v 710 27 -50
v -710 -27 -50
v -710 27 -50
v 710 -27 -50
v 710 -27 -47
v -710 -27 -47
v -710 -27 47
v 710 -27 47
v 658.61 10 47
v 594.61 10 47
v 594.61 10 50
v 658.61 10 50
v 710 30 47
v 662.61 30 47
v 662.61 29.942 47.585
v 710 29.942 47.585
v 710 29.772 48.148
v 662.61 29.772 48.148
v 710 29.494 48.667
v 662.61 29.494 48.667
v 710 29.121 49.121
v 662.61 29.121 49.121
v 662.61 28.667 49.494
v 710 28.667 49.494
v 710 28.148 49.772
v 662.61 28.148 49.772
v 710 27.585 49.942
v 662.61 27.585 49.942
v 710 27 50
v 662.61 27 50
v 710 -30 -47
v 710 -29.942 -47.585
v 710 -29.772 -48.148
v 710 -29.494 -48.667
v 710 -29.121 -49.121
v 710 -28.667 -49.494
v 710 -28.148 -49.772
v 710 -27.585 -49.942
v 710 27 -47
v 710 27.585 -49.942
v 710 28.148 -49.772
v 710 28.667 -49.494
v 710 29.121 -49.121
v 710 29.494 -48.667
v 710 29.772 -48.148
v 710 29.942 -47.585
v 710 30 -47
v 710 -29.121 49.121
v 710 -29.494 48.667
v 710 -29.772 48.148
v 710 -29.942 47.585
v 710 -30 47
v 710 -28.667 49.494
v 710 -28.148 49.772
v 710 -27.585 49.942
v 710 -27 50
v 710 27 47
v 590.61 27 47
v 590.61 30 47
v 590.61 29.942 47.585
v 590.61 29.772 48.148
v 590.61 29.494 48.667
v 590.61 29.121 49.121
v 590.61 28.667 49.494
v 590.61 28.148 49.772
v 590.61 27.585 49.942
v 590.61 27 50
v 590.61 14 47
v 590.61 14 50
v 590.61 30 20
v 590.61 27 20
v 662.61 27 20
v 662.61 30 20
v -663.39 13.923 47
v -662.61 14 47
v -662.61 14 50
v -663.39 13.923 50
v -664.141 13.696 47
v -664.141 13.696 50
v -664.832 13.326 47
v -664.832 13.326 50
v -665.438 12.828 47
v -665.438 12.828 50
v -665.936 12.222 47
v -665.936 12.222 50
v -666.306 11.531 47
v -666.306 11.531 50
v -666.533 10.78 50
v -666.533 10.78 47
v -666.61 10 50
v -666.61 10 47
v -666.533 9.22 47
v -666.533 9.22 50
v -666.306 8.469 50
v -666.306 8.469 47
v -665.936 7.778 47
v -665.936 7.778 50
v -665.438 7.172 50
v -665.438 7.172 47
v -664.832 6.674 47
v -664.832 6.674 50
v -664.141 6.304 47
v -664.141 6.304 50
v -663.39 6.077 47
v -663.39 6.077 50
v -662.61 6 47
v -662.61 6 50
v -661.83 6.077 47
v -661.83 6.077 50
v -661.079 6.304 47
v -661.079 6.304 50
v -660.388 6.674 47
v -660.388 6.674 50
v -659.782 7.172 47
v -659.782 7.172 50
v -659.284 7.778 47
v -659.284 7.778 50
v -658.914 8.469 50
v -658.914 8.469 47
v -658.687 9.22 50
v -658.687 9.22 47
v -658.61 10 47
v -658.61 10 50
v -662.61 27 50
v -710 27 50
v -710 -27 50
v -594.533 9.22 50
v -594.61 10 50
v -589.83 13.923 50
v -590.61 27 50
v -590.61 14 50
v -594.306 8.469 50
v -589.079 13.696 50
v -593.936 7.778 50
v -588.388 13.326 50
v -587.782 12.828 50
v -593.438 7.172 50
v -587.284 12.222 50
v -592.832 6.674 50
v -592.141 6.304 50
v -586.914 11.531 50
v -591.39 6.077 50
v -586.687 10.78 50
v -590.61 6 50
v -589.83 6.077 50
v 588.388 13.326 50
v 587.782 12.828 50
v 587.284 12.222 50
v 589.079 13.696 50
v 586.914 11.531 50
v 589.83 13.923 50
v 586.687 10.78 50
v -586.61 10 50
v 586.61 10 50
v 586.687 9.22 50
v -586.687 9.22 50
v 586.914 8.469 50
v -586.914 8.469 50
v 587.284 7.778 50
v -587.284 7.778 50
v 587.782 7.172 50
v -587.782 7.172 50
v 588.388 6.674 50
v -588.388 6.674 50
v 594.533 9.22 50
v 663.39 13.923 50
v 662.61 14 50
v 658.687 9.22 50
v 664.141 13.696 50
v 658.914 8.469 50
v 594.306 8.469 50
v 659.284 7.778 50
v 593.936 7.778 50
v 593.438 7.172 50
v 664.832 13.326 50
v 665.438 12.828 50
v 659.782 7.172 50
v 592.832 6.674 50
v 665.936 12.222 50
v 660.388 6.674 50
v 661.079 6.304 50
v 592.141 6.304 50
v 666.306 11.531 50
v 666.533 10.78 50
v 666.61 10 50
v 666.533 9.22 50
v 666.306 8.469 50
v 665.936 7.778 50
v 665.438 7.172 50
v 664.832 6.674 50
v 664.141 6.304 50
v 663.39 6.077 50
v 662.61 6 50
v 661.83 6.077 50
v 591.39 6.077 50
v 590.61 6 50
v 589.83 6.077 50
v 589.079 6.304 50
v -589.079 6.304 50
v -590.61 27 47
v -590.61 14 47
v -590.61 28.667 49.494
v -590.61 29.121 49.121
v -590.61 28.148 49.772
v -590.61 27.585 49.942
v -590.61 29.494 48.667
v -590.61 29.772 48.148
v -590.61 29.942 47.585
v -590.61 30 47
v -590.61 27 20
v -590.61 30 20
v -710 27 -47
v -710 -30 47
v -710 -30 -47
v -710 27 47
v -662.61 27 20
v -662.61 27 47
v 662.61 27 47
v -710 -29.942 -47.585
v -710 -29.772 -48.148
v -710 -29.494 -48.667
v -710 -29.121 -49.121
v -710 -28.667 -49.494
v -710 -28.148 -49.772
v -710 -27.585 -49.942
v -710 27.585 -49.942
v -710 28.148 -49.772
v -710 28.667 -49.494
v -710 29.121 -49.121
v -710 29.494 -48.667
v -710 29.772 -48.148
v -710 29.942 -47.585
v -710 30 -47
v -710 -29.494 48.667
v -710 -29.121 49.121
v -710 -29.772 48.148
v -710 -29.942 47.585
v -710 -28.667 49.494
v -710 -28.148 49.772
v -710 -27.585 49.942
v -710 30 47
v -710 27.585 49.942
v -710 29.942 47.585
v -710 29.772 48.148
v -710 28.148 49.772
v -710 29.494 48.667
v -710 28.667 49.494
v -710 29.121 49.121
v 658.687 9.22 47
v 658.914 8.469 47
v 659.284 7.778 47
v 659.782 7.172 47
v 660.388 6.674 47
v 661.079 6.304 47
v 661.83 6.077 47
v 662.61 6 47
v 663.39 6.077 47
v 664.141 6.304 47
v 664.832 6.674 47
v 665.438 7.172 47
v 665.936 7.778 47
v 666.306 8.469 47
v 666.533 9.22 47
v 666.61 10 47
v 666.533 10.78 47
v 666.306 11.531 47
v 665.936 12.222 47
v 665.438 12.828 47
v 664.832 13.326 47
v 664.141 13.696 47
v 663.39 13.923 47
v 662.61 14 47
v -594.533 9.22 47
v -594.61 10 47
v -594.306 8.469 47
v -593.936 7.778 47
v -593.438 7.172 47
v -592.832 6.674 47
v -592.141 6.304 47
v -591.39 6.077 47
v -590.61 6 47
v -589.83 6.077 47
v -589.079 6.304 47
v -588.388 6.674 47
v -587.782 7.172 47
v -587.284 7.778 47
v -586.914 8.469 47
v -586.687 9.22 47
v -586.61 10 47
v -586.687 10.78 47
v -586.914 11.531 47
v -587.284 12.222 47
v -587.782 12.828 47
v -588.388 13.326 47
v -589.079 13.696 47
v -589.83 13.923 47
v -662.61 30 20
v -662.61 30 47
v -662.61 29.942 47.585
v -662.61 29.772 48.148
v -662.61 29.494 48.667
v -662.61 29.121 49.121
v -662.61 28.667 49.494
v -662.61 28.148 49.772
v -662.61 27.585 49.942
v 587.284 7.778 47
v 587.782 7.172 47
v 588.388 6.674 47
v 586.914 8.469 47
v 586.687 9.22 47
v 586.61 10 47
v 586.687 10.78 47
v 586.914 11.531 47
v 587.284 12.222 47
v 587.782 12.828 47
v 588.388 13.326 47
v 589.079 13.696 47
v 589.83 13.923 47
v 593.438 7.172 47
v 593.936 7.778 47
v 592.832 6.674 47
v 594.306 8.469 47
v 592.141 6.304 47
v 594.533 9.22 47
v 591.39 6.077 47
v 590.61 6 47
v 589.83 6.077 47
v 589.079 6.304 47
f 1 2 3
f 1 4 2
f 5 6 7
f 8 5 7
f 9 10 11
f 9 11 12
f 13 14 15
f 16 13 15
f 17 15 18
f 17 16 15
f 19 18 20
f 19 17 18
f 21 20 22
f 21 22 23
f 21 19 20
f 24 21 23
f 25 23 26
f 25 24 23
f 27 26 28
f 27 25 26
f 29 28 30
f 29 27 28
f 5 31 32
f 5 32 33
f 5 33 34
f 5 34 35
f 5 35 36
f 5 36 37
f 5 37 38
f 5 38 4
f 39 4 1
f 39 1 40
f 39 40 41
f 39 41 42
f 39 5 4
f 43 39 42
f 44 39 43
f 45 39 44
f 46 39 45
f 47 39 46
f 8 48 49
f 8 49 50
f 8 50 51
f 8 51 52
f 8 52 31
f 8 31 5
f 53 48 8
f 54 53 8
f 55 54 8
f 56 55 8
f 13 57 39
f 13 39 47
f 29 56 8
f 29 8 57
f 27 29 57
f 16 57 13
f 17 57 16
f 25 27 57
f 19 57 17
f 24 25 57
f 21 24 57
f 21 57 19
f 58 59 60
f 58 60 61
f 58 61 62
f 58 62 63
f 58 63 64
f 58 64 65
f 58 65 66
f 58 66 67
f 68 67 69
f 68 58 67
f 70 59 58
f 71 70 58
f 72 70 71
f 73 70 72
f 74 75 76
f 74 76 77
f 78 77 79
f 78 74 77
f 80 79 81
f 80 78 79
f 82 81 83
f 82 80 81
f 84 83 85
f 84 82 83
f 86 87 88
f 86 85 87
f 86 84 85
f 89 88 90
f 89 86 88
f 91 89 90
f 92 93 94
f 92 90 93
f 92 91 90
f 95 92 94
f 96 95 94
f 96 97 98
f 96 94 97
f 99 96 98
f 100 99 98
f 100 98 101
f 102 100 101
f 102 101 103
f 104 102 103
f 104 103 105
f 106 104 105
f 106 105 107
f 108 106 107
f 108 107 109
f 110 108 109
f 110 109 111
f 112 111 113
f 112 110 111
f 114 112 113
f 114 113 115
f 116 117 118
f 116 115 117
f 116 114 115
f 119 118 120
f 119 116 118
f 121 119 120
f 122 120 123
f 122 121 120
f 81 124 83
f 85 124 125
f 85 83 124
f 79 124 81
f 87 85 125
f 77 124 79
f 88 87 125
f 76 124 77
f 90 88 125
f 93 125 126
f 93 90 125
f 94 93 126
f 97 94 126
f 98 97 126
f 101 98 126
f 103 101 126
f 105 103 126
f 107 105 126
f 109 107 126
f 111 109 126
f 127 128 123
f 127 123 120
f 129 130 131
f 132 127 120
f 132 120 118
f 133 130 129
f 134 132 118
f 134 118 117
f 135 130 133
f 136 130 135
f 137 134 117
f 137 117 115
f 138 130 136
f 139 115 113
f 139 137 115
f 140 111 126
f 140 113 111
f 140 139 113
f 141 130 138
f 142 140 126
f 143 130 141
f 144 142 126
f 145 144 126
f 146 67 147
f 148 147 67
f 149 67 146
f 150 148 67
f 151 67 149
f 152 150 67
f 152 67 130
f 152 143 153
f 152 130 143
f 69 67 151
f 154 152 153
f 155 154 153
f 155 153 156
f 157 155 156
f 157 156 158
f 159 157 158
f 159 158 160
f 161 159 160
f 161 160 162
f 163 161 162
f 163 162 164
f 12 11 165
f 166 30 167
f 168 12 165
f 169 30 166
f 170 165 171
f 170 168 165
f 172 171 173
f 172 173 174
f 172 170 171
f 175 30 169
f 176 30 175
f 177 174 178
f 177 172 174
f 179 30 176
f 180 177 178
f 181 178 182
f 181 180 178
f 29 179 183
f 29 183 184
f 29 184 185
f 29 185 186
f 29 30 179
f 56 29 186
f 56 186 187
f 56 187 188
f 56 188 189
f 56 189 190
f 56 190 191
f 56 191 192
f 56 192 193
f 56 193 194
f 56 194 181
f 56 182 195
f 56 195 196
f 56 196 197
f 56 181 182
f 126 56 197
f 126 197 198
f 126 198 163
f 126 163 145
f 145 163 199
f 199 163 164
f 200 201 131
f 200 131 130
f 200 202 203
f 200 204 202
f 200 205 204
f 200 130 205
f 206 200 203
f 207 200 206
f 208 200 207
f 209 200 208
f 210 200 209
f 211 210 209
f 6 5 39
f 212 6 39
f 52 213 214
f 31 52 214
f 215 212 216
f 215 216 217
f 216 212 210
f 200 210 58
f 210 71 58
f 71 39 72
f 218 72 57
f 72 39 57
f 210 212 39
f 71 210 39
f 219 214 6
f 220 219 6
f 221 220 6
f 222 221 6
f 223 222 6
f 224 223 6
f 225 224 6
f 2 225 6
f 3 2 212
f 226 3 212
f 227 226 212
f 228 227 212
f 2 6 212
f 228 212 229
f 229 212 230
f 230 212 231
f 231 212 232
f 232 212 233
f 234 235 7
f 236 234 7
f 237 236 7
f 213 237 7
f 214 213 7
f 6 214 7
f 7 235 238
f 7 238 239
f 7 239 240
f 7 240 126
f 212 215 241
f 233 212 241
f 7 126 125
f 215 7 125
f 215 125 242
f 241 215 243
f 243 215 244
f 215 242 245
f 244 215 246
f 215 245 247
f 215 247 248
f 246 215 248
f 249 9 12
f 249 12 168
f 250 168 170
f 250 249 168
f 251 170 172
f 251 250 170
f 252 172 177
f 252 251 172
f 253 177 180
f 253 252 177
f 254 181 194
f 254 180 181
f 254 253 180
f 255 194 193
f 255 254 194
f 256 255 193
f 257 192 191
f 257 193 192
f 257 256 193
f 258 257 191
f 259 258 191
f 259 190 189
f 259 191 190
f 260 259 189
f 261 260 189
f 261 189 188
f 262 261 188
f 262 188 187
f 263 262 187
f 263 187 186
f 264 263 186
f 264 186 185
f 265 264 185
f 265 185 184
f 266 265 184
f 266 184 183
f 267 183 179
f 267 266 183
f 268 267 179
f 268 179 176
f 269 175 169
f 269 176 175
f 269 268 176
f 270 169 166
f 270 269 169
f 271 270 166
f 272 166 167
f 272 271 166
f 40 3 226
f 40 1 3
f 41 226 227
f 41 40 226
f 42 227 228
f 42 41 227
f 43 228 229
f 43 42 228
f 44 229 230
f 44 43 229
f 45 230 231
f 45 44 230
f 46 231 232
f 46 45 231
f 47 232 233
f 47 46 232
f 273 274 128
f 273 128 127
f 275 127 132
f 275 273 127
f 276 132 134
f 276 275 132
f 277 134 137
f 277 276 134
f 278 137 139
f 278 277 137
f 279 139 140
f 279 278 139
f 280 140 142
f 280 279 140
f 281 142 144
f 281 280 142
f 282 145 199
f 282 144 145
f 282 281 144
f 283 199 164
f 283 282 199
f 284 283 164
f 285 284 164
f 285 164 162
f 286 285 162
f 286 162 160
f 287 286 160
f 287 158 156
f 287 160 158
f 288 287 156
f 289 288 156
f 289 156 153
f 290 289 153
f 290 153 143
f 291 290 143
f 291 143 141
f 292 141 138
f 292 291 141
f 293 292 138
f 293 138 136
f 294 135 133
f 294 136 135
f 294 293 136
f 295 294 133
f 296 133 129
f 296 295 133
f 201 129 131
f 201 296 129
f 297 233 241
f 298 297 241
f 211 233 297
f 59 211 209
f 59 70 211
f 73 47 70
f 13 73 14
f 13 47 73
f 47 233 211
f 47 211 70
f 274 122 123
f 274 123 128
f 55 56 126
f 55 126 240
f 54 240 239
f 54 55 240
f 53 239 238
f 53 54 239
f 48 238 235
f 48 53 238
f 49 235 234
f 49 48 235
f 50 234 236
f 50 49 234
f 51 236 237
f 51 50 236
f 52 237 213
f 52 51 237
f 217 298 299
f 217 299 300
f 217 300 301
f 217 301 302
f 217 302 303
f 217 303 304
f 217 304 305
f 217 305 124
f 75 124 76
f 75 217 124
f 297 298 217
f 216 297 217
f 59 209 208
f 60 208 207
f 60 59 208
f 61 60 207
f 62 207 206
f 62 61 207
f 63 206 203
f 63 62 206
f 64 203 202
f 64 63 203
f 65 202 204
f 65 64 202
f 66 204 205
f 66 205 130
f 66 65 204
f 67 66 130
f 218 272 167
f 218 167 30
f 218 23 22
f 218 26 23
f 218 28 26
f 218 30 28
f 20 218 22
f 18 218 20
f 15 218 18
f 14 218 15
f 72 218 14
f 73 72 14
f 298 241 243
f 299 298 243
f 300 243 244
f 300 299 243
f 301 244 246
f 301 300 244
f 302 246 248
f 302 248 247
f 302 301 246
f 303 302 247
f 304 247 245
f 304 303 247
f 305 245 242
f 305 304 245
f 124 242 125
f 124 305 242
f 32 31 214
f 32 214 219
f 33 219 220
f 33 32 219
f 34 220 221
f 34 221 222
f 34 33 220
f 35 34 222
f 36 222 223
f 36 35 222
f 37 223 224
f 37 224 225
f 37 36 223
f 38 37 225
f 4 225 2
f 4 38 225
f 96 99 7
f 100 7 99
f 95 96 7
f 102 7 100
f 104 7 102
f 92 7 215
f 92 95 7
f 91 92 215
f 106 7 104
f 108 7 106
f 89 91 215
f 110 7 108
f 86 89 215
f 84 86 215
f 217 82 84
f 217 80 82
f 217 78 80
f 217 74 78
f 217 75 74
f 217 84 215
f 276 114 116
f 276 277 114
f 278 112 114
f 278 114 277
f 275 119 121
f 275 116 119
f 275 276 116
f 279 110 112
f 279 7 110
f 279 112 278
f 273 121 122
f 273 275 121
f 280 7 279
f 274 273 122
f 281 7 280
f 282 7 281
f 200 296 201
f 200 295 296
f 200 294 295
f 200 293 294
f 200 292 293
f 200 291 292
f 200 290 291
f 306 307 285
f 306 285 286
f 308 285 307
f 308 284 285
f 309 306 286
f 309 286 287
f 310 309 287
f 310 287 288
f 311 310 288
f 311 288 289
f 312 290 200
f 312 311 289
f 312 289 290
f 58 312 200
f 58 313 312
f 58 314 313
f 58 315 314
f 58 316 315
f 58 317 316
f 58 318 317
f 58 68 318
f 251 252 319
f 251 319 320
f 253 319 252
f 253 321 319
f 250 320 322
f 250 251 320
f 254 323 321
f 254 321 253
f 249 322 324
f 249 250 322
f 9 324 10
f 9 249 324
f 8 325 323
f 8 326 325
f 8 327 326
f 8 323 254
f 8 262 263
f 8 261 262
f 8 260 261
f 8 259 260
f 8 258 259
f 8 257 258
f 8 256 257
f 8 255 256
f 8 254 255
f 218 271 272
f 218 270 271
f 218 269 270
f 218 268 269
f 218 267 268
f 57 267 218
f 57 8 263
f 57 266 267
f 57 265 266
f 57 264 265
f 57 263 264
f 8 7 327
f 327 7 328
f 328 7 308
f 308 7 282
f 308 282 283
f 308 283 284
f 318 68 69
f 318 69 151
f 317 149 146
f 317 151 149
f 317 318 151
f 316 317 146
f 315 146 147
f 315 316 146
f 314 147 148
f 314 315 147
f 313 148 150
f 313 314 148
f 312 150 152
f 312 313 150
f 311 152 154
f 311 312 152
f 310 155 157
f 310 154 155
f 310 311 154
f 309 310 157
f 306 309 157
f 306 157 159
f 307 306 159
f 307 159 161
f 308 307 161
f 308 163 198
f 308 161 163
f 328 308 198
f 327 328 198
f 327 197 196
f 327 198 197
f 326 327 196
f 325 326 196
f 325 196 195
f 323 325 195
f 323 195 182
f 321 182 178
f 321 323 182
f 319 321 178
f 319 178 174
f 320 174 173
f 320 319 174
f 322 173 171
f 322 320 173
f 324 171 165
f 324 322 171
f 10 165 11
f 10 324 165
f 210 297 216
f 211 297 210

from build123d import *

# Parameters (mm, degrees)
F0_W     = 54
F0_H     = 94
F1_DEPTH = 710
F3_START = 20
F3_DEPTH = 35
F4_START = 20
F4_DEPTH = 35


with BuildPart() as f1:
    # F0 (on Right) → F1 (new body, symmetric)
    with BuildSketch(Plane.YZ):
        with BuildLine():
            ThreePointArc((30, 47), (29.1213203436, 49.1213203436), (27, 50))
            Line((27, 50), (-27, 50))
            ThreePointArc((-27, 50), (-29.1213203436, 49.1213203436), (-30, 47))
            Line((-30, 47), (-30, -47))
            ThreePointArc((-30, -47), (-29.1213203436, -49.1213203436), (-27, -50))
            Line((-27, -50), (27, -50))
            ThreePointArc((27, -50), (29.1213203436, -49.1213203436), (30, -47))
            Line((30, -47), (30, 47))
        make_face()
        Rectangle(F0_W, F0_H, mode=Mode.SUBTRACT)
    extrude(amount=F1_DEPTH, both=True)

    # F2 (on Top) → F3 (cut)
    with BuildSketch(Plane.XY.offset(F3_START)):
        with BuildLine():
            Line((-590.61, 40), (-662.61, 40))
            Line((-662.61, 40), (-662.61, 14))
            ThreePointArc((-662.61, 14), (-665.4384271247, 7.1715728753), (-658.61, 10))
            Line((-658.61, 10), (-594.61, 10))
            ThreePointArc((-594.61, 10), (-587.7815728753, 7.1715728753), (-590.61, 14))
            Line((-590.61, 14), (-590.61, 40))
        make_face()
    extrude(amount=F3_DEPTH, mode=Mode.SUBTRACT)

    # F2 (on Top) → F4 (cut)
    with BuildSketch(Plane.XY.offset(F4_START)):
        with BuildLine():
            Line((662.61, 14), (662.61, 40))
            Line((662.61, 40), (590.61, 40))
            Line((590.61, 40), (590.61, 14))
            ThreePointArc((590.61, 14), (587.7815728753, 7.1715728753), (594.61, 10))
            Line((594.61, 10), (658.61, 10))
            ThreePointArc((658.61, 10), (665.4384271247, 7.1715728753), (662.61, 14))
        make_face()
    extrude(amount=F4_DEPTH, mode=Mode.SUBTRACT)


solid = f1.part
